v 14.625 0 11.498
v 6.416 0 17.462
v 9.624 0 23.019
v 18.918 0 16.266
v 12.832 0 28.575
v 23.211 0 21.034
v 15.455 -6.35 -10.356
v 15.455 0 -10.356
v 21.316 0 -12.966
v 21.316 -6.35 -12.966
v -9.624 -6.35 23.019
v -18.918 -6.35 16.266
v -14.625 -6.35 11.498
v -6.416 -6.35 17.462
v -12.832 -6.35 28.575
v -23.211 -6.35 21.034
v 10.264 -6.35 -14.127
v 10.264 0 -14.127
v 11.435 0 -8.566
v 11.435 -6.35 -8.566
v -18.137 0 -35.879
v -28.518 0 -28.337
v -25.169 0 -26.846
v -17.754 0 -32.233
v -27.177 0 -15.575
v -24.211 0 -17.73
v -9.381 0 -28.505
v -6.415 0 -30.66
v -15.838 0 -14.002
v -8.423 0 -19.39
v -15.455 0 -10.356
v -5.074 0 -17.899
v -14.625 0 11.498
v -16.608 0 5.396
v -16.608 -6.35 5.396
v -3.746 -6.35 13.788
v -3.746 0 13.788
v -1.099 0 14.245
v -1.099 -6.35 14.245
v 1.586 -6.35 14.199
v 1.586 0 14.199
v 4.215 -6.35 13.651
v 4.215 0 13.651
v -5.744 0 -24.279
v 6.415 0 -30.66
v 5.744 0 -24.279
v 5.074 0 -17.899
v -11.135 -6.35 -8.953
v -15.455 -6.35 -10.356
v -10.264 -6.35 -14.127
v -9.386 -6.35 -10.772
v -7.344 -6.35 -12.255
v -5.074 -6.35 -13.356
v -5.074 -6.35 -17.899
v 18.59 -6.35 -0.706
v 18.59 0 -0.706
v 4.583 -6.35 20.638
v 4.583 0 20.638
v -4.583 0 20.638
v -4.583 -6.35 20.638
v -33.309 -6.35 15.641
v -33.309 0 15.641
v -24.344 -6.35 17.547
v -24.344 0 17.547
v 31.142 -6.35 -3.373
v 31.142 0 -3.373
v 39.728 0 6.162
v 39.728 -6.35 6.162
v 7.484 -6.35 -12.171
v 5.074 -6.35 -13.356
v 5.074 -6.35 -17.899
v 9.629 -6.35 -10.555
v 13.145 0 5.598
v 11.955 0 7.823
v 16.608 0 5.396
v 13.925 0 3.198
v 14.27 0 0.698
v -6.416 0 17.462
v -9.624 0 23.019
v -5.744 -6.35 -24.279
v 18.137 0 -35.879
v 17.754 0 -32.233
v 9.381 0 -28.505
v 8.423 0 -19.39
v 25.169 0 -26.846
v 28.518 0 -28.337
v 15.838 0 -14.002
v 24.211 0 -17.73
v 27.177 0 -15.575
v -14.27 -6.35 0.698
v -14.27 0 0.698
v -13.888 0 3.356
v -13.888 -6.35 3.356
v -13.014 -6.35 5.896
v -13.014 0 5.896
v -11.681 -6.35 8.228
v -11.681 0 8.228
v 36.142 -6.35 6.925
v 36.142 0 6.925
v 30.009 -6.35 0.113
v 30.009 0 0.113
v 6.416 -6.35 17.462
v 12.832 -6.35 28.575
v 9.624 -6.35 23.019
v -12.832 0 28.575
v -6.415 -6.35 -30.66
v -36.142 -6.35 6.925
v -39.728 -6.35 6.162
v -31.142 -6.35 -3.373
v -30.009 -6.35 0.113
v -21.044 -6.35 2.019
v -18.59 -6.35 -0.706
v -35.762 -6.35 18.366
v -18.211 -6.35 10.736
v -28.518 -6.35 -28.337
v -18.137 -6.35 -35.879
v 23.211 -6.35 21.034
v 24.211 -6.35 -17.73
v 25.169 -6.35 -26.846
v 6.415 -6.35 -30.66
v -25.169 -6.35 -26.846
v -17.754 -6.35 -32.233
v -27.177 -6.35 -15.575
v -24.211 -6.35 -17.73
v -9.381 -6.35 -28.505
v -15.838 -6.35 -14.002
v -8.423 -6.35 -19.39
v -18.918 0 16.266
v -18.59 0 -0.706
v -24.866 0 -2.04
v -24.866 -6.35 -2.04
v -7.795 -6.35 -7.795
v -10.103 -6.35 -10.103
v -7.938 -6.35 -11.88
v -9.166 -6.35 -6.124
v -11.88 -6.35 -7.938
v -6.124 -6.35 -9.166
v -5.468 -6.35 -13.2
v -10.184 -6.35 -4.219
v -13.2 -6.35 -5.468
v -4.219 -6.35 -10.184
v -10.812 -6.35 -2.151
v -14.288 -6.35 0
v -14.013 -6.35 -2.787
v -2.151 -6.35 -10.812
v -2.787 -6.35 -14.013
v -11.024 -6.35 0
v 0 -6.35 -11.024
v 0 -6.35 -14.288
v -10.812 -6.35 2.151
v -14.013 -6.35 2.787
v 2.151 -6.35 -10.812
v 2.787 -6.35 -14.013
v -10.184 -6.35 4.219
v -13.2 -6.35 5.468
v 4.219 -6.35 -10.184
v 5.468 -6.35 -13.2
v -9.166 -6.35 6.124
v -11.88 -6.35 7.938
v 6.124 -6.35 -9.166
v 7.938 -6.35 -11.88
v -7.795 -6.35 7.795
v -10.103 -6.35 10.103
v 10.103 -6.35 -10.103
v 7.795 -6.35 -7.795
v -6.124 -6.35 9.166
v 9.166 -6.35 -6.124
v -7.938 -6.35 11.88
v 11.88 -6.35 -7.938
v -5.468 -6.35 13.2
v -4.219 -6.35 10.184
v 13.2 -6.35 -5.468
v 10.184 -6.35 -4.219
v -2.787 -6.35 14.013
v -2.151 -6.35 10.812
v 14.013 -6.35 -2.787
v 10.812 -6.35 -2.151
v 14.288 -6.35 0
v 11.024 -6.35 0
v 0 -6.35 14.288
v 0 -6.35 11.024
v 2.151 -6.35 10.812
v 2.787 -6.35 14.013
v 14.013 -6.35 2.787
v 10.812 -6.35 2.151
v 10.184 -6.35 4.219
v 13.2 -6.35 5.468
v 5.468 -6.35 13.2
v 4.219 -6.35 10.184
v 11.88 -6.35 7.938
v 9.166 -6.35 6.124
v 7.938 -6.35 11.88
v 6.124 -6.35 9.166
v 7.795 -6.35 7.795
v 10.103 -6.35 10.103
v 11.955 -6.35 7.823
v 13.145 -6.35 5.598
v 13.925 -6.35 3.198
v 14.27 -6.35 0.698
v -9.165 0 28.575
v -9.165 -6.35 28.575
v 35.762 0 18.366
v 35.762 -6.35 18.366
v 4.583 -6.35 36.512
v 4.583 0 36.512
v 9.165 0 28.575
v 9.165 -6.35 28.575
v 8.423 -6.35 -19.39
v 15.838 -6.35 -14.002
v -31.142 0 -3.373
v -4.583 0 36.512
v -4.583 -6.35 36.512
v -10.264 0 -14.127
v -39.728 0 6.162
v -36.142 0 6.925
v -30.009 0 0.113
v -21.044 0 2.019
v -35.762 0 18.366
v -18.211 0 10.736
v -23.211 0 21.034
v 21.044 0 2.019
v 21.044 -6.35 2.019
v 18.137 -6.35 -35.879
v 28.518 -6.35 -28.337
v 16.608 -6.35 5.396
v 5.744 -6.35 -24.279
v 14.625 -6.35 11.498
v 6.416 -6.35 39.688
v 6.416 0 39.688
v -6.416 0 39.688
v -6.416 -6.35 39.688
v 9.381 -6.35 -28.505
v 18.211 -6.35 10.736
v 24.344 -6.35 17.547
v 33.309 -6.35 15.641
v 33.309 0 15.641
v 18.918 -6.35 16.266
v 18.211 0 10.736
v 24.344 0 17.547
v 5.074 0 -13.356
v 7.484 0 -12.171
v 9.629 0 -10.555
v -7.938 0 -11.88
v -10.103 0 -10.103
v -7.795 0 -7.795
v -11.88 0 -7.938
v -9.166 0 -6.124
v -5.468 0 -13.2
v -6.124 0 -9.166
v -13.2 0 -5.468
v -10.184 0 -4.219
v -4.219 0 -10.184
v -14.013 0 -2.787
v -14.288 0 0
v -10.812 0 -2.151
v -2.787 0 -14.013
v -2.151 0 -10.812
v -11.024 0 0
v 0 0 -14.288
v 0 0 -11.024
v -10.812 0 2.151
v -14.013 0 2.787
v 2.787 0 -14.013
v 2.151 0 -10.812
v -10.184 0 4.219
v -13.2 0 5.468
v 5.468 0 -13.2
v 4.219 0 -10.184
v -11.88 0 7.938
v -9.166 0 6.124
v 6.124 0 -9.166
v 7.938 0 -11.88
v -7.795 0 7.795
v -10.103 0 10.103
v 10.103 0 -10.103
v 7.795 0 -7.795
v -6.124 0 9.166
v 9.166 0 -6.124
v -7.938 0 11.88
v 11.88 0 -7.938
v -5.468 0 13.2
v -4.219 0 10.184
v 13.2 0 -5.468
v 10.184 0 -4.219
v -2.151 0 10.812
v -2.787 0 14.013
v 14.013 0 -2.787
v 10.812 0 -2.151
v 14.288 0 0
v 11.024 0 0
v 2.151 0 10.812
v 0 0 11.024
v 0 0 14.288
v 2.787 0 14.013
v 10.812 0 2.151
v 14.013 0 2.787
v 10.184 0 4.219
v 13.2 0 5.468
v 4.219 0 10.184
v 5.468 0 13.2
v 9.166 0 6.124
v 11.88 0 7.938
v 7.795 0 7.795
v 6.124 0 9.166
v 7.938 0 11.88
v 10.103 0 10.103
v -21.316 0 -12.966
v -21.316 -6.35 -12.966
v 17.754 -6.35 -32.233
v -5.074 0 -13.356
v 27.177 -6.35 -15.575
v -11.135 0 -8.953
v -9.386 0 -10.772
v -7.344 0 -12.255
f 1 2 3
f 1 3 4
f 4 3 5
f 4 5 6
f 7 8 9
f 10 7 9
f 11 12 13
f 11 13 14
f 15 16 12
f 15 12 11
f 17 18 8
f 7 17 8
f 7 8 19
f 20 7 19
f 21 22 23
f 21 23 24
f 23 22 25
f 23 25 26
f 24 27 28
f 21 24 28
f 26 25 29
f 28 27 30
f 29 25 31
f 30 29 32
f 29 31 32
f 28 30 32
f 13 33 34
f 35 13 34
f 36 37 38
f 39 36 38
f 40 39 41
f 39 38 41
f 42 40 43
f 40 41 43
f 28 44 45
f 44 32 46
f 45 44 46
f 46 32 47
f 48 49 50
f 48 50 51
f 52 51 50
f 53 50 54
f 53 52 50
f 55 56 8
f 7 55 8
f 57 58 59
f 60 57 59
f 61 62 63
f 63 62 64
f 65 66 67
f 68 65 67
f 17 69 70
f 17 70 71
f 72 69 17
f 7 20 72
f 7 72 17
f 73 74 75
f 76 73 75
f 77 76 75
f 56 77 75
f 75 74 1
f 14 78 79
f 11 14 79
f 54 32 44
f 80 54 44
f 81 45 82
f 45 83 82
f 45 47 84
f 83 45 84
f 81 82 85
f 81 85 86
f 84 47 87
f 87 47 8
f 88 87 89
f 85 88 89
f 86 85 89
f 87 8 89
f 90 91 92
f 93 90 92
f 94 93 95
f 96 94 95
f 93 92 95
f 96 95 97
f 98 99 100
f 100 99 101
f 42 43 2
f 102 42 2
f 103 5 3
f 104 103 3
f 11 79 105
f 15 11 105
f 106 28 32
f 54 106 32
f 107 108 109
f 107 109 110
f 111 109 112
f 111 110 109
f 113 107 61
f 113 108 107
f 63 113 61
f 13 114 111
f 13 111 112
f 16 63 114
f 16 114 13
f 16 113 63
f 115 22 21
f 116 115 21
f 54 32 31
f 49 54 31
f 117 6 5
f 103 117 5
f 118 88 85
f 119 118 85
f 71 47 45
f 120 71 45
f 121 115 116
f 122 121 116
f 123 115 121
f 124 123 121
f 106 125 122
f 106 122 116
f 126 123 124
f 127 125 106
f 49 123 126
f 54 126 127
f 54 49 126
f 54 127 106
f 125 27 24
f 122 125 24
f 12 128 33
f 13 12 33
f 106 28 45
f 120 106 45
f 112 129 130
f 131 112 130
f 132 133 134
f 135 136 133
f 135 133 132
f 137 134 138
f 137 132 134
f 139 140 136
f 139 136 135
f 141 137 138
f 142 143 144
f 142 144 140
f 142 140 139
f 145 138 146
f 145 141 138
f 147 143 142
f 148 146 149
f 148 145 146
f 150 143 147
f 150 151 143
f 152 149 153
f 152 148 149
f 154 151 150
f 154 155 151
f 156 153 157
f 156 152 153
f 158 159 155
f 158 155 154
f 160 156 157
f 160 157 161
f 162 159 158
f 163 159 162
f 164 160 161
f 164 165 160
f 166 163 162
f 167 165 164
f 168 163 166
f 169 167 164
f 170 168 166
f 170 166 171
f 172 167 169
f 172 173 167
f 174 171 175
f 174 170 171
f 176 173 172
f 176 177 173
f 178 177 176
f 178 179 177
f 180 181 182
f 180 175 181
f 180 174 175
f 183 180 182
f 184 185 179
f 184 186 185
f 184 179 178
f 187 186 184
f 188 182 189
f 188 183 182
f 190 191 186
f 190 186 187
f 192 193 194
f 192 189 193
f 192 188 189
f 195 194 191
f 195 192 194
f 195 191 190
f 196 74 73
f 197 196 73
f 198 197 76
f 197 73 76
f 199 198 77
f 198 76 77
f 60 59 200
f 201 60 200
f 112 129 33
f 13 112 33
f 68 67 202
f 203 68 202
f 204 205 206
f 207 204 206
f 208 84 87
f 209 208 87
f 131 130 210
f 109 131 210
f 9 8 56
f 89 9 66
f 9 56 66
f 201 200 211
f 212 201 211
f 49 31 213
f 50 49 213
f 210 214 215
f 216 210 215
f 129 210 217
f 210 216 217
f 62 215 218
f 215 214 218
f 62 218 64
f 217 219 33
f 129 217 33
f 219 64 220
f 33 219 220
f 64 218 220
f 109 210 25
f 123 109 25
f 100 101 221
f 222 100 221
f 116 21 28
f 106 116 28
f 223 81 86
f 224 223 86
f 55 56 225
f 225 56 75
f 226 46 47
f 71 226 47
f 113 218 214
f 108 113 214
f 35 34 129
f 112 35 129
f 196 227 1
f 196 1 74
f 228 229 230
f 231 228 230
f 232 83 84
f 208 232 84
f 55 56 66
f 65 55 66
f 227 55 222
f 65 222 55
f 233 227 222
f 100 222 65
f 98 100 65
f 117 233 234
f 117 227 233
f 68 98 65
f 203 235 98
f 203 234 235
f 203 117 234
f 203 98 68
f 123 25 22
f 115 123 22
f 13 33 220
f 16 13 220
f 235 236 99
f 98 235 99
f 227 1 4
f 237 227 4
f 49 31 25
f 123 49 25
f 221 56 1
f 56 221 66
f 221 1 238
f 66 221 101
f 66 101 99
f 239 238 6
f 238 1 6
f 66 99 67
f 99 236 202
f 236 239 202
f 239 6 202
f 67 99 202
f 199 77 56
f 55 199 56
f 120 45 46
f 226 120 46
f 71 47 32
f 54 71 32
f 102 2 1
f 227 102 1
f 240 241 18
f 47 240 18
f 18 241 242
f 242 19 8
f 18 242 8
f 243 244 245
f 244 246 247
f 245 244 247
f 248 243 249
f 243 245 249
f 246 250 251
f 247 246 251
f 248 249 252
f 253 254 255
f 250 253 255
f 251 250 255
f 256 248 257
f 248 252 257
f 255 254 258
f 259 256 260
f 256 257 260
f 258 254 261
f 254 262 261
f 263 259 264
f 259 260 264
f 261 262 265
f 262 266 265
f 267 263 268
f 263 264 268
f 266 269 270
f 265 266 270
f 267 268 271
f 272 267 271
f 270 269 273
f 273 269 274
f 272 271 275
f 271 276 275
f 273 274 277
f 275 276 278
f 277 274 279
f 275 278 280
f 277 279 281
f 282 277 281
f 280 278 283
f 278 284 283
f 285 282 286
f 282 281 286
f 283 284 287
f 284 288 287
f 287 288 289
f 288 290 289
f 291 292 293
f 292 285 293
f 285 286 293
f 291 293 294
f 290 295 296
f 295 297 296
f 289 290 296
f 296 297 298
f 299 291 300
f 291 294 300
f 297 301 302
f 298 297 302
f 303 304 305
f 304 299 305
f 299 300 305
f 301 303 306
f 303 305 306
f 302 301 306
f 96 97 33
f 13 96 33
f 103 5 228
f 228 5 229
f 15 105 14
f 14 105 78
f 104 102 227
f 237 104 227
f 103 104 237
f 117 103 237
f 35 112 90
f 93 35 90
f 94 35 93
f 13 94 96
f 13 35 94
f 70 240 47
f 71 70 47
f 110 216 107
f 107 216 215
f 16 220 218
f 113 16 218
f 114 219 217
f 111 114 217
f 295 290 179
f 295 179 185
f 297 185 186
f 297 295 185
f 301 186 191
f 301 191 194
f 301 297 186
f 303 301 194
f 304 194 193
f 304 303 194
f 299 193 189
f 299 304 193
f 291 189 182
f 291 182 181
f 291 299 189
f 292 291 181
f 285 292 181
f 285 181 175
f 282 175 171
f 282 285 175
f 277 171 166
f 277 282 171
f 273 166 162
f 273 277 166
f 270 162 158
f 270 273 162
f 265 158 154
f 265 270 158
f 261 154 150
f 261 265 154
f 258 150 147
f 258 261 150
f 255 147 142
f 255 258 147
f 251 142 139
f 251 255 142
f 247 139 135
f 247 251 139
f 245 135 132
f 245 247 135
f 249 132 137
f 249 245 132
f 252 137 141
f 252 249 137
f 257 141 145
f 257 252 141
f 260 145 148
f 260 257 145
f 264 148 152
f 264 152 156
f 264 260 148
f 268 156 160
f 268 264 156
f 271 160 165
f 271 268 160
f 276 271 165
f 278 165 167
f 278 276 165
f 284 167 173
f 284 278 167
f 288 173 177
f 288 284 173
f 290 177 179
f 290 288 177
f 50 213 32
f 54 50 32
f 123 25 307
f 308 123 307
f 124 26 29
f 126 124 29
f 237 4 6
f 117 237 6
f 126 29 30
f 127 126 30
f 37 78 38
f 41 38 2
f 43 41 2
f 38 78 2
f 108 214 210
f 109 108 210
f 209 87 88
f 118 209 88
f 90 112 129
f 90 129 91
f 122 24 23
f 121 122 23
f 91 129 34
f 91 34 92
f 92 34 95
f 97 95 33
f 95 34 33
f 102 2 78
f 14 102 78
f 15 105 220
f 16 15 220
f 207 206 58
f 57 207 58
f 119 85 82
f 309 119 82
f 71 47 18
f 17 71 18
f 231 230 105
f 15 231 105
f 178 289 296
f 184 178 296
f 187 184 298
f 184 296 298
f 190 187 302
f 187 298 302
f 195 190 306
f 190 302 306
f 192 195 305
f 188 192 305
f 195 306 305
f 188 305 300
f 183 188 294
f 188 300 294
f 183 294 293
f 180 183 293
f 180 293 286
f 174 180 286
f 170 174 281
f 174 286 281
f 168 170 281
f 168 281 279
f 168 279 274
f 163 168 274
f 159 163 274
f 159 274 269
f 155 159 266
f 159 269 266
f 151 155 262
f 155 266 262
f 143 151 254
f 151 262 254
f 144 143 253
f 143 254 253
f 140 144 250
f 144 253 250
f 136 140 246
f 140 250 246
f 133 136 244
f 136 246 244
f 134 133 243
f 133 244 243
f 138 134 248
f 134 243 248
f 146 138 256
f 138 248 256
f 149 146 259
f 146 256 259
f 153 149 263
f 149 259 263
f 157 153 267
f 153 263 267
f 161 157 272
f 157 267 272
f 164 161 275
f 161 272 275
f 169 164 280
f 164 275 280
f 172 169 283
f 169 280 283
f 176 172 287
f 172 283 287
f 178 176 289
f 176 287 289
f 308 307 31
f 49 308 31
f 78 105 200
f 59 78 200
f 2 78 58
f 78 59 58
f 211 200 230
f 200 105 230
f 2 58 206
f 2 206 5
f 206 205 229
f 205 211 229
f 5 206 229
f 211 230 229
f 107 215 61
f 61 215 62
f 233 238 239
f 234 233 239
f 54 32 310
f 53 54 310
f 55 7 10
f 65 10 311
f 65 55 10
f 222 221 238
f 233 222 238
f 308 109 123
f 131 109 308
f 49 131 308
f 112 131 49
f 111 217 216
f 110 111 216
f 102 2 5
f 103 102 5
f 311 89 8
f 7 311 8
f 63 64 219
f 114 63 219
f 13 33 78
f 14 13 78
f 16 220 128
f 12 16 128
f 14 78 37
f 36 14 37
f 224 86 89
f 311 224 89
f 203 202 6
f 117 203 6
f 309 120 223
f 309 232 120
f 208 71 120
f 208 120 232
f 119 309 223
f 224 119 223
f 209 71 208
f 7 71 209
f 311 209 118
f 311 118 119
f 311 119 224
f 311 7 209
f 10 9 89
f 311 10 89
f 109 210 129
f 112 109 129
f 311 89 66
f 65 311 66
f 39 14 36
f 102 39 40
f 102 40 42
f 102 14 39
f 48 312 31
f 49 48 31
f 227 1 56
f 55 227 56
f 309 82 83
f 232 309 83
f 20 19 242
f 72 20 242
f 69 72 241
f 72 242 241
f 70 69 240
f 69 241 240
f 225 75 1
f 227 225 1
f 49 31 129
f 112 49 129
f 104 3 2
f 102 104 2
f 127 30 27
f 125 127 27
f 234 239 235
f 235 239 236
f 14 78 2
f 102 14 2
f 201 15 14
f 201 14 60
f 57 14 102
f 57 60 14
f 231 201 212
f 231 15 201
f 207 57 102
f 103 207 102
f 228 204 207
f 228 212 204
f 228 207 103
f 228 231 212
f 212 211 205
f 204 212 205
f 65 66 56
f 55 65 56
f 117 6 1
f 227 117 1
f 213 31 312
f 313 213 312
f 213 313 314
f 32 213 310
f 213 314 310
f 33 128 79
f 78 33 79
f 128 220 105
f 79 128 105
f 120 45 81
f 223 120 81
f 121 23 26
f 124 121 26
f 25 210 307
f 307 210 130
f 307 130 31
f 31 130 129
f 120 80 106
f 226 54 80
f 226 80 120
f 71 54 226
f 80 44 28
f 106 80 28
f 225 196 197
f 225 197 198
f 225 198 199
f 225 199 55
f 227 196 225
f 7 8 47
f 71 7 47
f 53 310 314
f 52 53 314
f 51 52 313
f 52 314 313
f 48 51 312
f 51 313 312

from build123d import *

# Parameters (mm, degrees)
F2_DEPTH = 6.35
F0_R     = 14.2875
F0_R_2   = 11.0236


with BuildPart() as f2:
    # F0 (on Front) → F2 (new body)
    with BuildSketch(Plane.XZ):
        Polygon((-6.4158048664, 17.4625), (6.4158048664, 17.4625), (12.8316097327, 28.575), (6.4158048664, 39.6875), (-6.4158048664, 39.6875), (-12.8316097327, 28.575), align=None)
        Polygon((9.1654355234, 28.575), (4.5827177617, 20.6375), (-4.5827177617, 20.6375), (-9.1654355234, 28.575), (-4.5827177617, 36.5125), (4.5827177617, 36.5125), align=None, mode=Mode.SUBTRACT)
    extrude(amount=F2_DEPTH)


with BuildPart() as f2b:
    # F0 (on Front) → F2, piece 2 (new body)
    with BuildSketch(Plane.XZ):
        Polygon((-18.5904171521, -0.7055837612), (-14.6252316795, 11.4980022897), (-23.2112544805, 21.0337466651), (-35.7624627542, 18.3659049897), (-39.7276482268, 6.1623189388), (-31.1416254257, -3.3734254366), align=None)
        Polygon((-33.3093133824, 15.6414065967), (-24.3441646156, 17.5470077935), (-18.2112911863, 10.735761811), (-21.0435665238, 2.0189146318), (-30.0087152907, 0.1133134351), (-36.14158872, 6.9245594175), align=None, mode=Mode.SUBTRACT)
    extrude(amount=F2_DEPTH)


with BuildPart() as f2c:
    # F0 (on Front) → F2, piece 3 (new body)
    with BuildSketch(Plane.XZ):
        Polygon((-5.0737047987, -17.8985747463), (-15.4546951376, -10.3563437822), (-27.1769539232, -15.5754296502), (-28.5182223698, -28.3367464822), (-18.1372320309, -35.8789774463), (-6.4149732453, -30.6598915783), align=None)
        Polygon((-25.169005574, -26.8455790914), (-24.2109566835, -17.7303527828), (-15.8379146938, -14.0024343057), (-8.4229215946, -19.3897421372), (-9.380970485, -28.5049684457), (-17.7540124747, -32.2328869229), align=None, mode=Mode.SUBTRACT)
    extrude(amount=F2_DEPTH)


with BuildPart() as f2d:
    # F0 (on Front) → F2, piece 4 (new body)
    with BuildSketch(Plane.XZ):
        Polygon((15.4546951376, -10.3563437822), (5.0737047987, -17.8985747463), (6.4149732453, -30.6598915783), (18.1372320309, -35.8789774463), (28.5182223698, -28.3367464822), (27.1769539232, -15.5754296502), align=None)
        Polygon((17.7540124747, -32.2328869229), (9.380970485, -28.5049684457), (8.4229215946, -19.3897421372), (15.8379146938, -14.0024343057), (24.2109566835, -17.7303527828), (25.169005574, -26.8455790914), align=None, mode=Mode.SUBTRACT)
    extrude(amount=F2_DEPTH)


with BuildPart() as f2e:
    # F0 (on Front) → F2, piece 5 (new body)
    with BuildSketch(Plane.XZ):
        Polygon((14.6252316795, 11.4980022897), (18.5904171521, -0.7055837612), (31.1416254257, -3.3734254366), (39.7276482268, 6.1623189388), (35.7624627542, 18.3659049897), (23.2112544805, 21.0337466651), align=None)
        Polygon((36.14158872, 6.9245594175), (30.0087152907, 0.1133134351), (21.0435665238, 2.0189146318), (18.2112911863, 10.735761811), (24.3441646156, 17.5470077935), (33.3093133824, 15.6414065967), align=None, mode=Mode.SUBTRACT)
    extrude(amount=F2_DEPTH)


with BuildPart() as f2f:
    # F0 (on Front) → F2, piece 6 (new body)
    with BuildSketch(Plane.XZ):
        Circle(F0_R)
        Circle(F0_R_2, mode=Mode.SUBTRACT)
    extrude(amount=F2_DEPTH)


with BuildPart() as f2g:
    # F1 (on Front) → F2, piece 7 (new body)
    with BuildSketch(Plane.XZ):
        Polygon((-18.5904171521, -0.7055837612), (-24.8660210684, -2.039504552), (-31.1416254257, -3.3734254366), (-27.1769539232, -15.5754296502), (-21.315824511, -12.9658867075), (-15.4546951376, -10.3563437822), align=None)
    extrude(amount=F2_DEPTH)


with BuildPart() as f2h:
    # F1 (on Front) → F2, piece 8 (new body)
    with BuildSketch(Plane.XZ):
        Polygon((5.7443390338, -24.2792332749), (5.0737047987, -17.8985747463), (-5.0737047987, -17.8985747463), (-5.7443390492, -24.2792334216), (-6.4149732453, -30.6598915783), (6.4149732453, -30.6598915783), align=None)
    extrude(amount=F2_DEPTH)


with BuildPart() as f2i:
    # F1 (on Front) → F2, piece 9 (new body)
    with BuildSketch(Plane.XZ):
        Polygon((24.8660214244, -2.0395046277), (18.5904171521, -0.7055837612), (15.4546951376, -10.3563437822), (21.3158242932, -12.9658866106), (27.1769539232, -15.5754296502), (31.1416254257, -3.3734254366), align=None)
    extrude(amount=F2_DEPTH)


with BuildPart() as f2j:
    # F1 (on Front) → F2, piece 10 (new body)
    with BuildSketch(Plane.XZ):
        Polygon((18.918243317, 16.2658747406), (23.2112544805, 21.0337466651), (12.8316097327, 28.575), (9.6237072438, 23.0187499034), (6.4158048664, 17.4625), (14.6252316795, 11.4980022897), align=None)
    extrude(amount=F2_DEPTH)


with BuildPart() as f2k:
    # F1 (on Front) → F2, piece 11 (new body)
    with BuildSketch(Plane.XZ):
        Polygon((-6.4158048664, 17.4625), (-9.6237073033, 23.0187500066), (-12.8316097327, 28.575), (-23.2112544805, 21.0337466651), (-18.918243317, 16.2658747406), (-14.6252316795, 11.4980022897), align=None)
    extrude(amount=F2_DEPTH)


with BuildPart() as f2l:
    # F1 (on Front) → F2, piece 12 (new body)
    with BuildSketch(Plane.XZ):
        with BuildLine():
            Line((-10.2641997882, -14.127459395), (-5.0737047987, -17.8985747463))
            Line((-5.0737047987, -17.8985747463), (-5.0737047987, -13.3562785186))
            ThreePointArc((-5.0737047987, -13.3562785186), (-8.3979817921, -11.5588303071), (-11.1347147113, -8.9526970544))
            Line((-11.1347147113, -8.9526970544), (-15.4546951376, -10.3563437822))
            Line((-15.4546951376, -10.3563437822), (-10.2641997882, -14.127459395))
        make_face()
    extrude(amount=F2_DEPTH)


with BuildPart() as f2m:
    # F1 (on Front) → F2, piece 13 (new body)
    with BuildSketch(Plane.XZ):
        with BuildLine():
            Line((10.2641999769, -14.1274592579), (15.4546951376, -10.3563437822))
            Line((15.4546951376, -10.3563437822), (11.4345332188, -8.5664523764))
            ThreePointArc((11.4345332188, -8.5664523764), (8.5945383372, -11.4134380018), (5.0737047987, -13.3562785186))
            Line((5.0737047987, -13.3562785186), (5.0737047987, -17.8985747463))
            Line((5.0737047987, -17.8985747463), (10.2641999769, -14.1274592579))
        make_face()
    extrude(amount=F2_DEPTH)


with BuildPart() as f2n:
    # F1 (on Front) → F2, piece 14 (new body)
    with BuildSketch(Plane.XZ):
        with BuildLine():
            Line((16.6078243421, 5.396209491), (14.6252316795, 11.4980022897))
            Line((14.6252316795, 11.4980022897), (11.9553369453, 7.823207448))
            ThreePointArc((11.9553369453, 7.823207448), (13.5882199766, 4.4150803071), (14.2704367258, 0.6980629667))
            Line((14.2704367258, 0.6980629667), (18.5904171521, -0.7055837612))
            Line((18.5904171521, -0.7055837612), (16.6078243421, 5.396209491))
        make_face()
    extrude(amount=F2_DEPTH)


with BuildPart() as f2o:
    # F1 (on Front) → F2, piece 15 (new body)
    with BuildSketch(Plane.XZ):
        with BuildLine():
            Line((-11.6806454415, 8.2277079628), (-14.6252316795, 11.4980022897))
            Line((-14.6252316795, 11.4980022897), (-16.6078244895, 5.3962090375))
            Line((-16.6078244895, 5.3962090375), (-18.5904171521, -0.7055837612))
            Line((-18.5904171521, -0.7055837612), (-14.2704367258, 0.6980629667))
            ThreePointArc((-14.2704367258, 0.6980629667), (-13.5106829899, 4.6469453833), (-11.6806454415, 8.2277079628))
        make_face()
    extrude(amount=F2_DEPTH)


with BuildPart() as f2p:
    # F1 (on Front) → F2, piece 16 (new body)
    with BuildSketch(Plane.XZ):
        with BuildLine():
            Line((4.2154973255, 13.6514555469), (6.4158048664, 17.4625))
            Line((6.4158048664, 17.4625), (0, 17.4625))
            Line((0, 17.4625), (-6.4158048664, 17.4625))
            Line((-6.4158048664, 17.4625), (-3.7459101322, 13.7877051583))
            ThreePointArc((-3.7459101322, 13.7877051583), (0.2444770381, 14.2854081926), (4.2154973255, 13.6514555469))
        make_face()
    extrude(amount=F2_DEPTH)


solid = Compound([f2.part, f2b.part, f2c.part, f2d.part, f2e.part, f2f.part, f2g.part, f2h.part, f2i.part, f2j.part, f2k.part, f2l.part, f2m.part, f2n.part, f2o.part, f2p.part])
